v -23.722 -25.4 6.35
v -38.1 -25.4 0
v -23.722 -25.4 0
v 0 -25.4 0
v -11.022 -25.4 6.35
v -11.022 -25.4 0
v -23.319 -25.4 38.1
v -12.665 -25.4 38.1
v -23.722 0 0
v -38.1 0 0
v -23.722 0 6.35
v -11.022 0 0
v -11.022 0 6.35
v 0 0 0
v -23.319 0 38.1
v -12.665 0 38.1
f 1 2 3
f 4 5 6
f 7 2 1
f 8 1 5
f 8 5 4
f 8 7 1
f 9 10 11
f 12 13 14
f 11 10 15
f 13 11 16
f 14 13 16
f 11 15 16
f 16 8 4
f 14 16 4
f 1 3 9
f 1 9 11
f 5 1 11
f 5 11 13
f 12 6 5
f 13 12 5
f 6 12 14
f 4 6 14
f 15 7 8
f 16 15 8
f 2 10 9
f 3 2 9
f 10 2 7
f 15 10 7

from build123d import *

# Parameters (mm, degrees)
F0_W     = 38.1
F0_H     = 38.1
F1_DEPTH = 25.4
F3_DEPTH = 25.4
F4_W     = 12.7
F4_H     = 6.35
F5_DEPTH = 25.4


with BuildPart() as f1:
    # F0 (on Front) → F1 (new body)
    with BuildSketch(Plane.XZ):
        with Locations((-19.05, 19.05)):
            Rectangle(F0_W, F0_H)
    extrude(amount=F1_DEPTH)

    # F2 (on face) → F3 (cut)
    with BuildSketch(Plane.XZ.offset(25.4)):
        Polygon((-38.1, 38.1), (-38.1, 0), (-23.319498, 38.1), align=None)
        Polygon((-12.6649, 38.1), (0, 0), (0, 38.1), align=None)
    extrude(amount=-F3_DEPTH, mode=Mode.SUBTRACT)

    # F4 (on face) → F5 (cut)
    with BuildSketch(Plane.XZ.offset(25.4)):
        with Locations((-17.371559, 3.175)):
            Rectangle(F4_W, F4_H)
    extrude(amount=-F5_DEPTH, mode=Mode.SUBTRACT)


solid = f1.part
